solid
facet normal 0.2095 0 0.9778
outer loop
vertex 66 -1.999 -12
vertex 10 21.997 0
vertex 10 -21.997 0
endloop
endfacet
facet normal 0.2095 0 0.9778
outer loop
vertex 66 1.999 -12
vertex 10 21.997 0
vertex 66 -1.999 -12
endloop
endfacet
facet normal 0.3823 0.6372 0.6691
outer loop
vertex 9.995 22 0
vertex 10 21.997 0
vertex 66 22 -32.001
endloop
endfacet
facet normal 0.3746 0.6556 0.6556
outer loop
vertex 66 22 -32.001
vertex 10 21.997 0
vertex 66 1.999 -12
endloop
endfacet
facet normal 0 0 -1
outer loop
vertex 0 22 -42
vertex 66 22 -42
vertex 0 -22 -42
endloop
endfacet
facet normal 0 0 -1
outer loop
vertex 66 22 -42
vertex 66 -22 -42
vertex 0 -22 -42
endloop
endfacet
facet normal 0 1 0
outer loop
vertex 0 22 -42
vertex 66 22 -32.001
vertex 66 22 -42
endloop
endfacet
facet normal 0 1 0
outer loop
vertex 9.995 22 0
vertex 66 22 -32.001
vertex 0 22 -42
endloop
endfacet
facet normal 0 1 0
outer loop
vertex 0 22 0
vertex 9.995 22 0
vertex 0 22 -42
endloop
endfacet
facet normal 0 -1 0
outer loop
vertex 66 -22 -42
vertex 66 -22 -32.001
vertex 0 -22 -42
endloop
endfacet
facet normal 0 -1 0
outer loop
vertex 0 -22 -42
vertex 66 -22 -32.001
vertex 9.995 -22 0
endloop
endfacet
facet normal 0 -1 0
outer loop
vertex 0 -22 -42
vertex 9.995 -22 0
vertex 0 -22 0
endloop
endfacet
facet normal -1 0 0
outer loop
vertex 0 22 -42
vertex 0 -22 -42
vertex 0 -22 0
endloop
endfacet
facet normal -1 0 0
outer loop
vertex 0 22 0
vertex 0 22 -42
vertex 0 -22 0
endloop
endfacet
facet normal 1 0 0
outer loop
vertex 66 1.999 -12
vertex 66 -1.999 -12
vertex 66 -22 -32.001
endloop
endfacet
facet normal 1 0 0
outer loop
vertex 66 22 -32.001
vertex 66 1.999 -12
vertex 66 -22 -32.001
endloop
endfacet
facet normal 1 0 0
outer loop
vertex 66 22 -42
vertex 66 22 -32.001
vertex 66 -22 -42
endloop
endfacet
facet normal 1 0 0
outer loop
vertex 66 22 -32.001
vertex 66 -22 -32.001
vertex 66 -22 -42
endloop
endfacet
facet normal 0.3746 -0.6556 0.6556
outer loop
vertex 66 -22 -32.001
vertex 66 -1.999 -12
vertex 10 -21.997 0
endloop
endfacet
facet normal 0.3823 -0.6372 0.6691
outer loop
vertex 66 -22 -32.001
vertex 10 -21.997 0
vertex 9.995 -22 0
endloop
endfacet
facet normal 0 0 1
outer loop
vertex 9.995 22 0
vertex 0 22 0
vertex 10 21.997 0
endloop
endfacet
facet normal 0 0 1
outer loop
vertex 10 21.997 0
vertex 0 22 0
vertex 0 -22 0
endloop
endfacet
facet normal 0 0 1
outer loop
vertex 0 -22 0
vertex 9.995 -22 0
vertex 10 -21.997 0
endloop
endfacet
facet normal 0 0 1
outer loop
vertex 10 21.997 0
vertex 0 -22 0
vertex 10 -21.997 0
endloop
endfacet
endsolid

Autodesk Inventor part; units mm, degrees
ref_plane "YZ Plane" through (0, 0, 0) normal (1, 0, 0) x (0, 1, 0)
ref_plane "XZ Plane" through (0, 0, 0) normal (0, 1, 0) x (-1, 0, 0)
sketch "草圖1" plane through (0, 0, 0) normal (0, 1, 0) x (-1, 0, 0)
  line L0 (0, 0) -> (-66, 0)
  line L1 (-66, 0) -> (-66, -42)
  line L2 (-66, -42) -> (0, -42)
  line L3 (0, -42) -> (0, 0)
  dimension "d0" = 66
  dimension "d1" = 42
extrude "擠出1" add sketch "草圖1" along normal mid plane 44
sketch "草圖2" plane through (0, 22, 0) normal (0, 1, 0) x (1, 0, 0)
  line L0 (0, 0) -> (66, 0) projected
  line L1 (10, 0) -> (66, 12)
  line L2 (66, 0) -> (66, 42) projected
  dimension "d4" = 10
  dimension "d5" = 30
extrude "擠出2" cut sketch "草圖2" against normal blind 60
sketch "草圖3" plane through (66, -22, -42) normal (1, 0, 0) x (0, 0, -1)
  line L0 (-30, 24) -> (-10, 44)
  line L1 (0, 44) -> (-42, 44) projected
  line L2 (-30, 44) -> (-30, 0) projected
  point P0 (-42, 22)
  point P1 (-30, 2)
  dimension "d8" = 20
  dimension "d9" = 20
ref_plane "工作平面1" through (10, 22, 0) normal (-0.3746, -0.6556, -0.6556) x (0.8682, 0, -0.4961)
sketch "草圖4" plane through (10, 22, 0) normal (-0.3746, -0.6556, -0.6556) x (0.8682, 0, -0.4961)
  line L0 (-15.1543, -12.3218) -> (93.717, -12.3218)
  line L1 (93.717, -12.3218) -> (93.717, 28.8166)
  line L2 (93.717, 28.8166) -> (-15.1543, 28.8166)
  line L3 (-15.1543, 28.8166) -> (-15.1543, -12.3218)
  point P0 (-8.6824, 13.3595)
extrude "擠出3" cut sketch "草圖4" against normal blind 40
mirror "鏡射1" about plane through (0, 0, 0) normal (0, 1, 0) of "擠出3"
properties part number "60"
